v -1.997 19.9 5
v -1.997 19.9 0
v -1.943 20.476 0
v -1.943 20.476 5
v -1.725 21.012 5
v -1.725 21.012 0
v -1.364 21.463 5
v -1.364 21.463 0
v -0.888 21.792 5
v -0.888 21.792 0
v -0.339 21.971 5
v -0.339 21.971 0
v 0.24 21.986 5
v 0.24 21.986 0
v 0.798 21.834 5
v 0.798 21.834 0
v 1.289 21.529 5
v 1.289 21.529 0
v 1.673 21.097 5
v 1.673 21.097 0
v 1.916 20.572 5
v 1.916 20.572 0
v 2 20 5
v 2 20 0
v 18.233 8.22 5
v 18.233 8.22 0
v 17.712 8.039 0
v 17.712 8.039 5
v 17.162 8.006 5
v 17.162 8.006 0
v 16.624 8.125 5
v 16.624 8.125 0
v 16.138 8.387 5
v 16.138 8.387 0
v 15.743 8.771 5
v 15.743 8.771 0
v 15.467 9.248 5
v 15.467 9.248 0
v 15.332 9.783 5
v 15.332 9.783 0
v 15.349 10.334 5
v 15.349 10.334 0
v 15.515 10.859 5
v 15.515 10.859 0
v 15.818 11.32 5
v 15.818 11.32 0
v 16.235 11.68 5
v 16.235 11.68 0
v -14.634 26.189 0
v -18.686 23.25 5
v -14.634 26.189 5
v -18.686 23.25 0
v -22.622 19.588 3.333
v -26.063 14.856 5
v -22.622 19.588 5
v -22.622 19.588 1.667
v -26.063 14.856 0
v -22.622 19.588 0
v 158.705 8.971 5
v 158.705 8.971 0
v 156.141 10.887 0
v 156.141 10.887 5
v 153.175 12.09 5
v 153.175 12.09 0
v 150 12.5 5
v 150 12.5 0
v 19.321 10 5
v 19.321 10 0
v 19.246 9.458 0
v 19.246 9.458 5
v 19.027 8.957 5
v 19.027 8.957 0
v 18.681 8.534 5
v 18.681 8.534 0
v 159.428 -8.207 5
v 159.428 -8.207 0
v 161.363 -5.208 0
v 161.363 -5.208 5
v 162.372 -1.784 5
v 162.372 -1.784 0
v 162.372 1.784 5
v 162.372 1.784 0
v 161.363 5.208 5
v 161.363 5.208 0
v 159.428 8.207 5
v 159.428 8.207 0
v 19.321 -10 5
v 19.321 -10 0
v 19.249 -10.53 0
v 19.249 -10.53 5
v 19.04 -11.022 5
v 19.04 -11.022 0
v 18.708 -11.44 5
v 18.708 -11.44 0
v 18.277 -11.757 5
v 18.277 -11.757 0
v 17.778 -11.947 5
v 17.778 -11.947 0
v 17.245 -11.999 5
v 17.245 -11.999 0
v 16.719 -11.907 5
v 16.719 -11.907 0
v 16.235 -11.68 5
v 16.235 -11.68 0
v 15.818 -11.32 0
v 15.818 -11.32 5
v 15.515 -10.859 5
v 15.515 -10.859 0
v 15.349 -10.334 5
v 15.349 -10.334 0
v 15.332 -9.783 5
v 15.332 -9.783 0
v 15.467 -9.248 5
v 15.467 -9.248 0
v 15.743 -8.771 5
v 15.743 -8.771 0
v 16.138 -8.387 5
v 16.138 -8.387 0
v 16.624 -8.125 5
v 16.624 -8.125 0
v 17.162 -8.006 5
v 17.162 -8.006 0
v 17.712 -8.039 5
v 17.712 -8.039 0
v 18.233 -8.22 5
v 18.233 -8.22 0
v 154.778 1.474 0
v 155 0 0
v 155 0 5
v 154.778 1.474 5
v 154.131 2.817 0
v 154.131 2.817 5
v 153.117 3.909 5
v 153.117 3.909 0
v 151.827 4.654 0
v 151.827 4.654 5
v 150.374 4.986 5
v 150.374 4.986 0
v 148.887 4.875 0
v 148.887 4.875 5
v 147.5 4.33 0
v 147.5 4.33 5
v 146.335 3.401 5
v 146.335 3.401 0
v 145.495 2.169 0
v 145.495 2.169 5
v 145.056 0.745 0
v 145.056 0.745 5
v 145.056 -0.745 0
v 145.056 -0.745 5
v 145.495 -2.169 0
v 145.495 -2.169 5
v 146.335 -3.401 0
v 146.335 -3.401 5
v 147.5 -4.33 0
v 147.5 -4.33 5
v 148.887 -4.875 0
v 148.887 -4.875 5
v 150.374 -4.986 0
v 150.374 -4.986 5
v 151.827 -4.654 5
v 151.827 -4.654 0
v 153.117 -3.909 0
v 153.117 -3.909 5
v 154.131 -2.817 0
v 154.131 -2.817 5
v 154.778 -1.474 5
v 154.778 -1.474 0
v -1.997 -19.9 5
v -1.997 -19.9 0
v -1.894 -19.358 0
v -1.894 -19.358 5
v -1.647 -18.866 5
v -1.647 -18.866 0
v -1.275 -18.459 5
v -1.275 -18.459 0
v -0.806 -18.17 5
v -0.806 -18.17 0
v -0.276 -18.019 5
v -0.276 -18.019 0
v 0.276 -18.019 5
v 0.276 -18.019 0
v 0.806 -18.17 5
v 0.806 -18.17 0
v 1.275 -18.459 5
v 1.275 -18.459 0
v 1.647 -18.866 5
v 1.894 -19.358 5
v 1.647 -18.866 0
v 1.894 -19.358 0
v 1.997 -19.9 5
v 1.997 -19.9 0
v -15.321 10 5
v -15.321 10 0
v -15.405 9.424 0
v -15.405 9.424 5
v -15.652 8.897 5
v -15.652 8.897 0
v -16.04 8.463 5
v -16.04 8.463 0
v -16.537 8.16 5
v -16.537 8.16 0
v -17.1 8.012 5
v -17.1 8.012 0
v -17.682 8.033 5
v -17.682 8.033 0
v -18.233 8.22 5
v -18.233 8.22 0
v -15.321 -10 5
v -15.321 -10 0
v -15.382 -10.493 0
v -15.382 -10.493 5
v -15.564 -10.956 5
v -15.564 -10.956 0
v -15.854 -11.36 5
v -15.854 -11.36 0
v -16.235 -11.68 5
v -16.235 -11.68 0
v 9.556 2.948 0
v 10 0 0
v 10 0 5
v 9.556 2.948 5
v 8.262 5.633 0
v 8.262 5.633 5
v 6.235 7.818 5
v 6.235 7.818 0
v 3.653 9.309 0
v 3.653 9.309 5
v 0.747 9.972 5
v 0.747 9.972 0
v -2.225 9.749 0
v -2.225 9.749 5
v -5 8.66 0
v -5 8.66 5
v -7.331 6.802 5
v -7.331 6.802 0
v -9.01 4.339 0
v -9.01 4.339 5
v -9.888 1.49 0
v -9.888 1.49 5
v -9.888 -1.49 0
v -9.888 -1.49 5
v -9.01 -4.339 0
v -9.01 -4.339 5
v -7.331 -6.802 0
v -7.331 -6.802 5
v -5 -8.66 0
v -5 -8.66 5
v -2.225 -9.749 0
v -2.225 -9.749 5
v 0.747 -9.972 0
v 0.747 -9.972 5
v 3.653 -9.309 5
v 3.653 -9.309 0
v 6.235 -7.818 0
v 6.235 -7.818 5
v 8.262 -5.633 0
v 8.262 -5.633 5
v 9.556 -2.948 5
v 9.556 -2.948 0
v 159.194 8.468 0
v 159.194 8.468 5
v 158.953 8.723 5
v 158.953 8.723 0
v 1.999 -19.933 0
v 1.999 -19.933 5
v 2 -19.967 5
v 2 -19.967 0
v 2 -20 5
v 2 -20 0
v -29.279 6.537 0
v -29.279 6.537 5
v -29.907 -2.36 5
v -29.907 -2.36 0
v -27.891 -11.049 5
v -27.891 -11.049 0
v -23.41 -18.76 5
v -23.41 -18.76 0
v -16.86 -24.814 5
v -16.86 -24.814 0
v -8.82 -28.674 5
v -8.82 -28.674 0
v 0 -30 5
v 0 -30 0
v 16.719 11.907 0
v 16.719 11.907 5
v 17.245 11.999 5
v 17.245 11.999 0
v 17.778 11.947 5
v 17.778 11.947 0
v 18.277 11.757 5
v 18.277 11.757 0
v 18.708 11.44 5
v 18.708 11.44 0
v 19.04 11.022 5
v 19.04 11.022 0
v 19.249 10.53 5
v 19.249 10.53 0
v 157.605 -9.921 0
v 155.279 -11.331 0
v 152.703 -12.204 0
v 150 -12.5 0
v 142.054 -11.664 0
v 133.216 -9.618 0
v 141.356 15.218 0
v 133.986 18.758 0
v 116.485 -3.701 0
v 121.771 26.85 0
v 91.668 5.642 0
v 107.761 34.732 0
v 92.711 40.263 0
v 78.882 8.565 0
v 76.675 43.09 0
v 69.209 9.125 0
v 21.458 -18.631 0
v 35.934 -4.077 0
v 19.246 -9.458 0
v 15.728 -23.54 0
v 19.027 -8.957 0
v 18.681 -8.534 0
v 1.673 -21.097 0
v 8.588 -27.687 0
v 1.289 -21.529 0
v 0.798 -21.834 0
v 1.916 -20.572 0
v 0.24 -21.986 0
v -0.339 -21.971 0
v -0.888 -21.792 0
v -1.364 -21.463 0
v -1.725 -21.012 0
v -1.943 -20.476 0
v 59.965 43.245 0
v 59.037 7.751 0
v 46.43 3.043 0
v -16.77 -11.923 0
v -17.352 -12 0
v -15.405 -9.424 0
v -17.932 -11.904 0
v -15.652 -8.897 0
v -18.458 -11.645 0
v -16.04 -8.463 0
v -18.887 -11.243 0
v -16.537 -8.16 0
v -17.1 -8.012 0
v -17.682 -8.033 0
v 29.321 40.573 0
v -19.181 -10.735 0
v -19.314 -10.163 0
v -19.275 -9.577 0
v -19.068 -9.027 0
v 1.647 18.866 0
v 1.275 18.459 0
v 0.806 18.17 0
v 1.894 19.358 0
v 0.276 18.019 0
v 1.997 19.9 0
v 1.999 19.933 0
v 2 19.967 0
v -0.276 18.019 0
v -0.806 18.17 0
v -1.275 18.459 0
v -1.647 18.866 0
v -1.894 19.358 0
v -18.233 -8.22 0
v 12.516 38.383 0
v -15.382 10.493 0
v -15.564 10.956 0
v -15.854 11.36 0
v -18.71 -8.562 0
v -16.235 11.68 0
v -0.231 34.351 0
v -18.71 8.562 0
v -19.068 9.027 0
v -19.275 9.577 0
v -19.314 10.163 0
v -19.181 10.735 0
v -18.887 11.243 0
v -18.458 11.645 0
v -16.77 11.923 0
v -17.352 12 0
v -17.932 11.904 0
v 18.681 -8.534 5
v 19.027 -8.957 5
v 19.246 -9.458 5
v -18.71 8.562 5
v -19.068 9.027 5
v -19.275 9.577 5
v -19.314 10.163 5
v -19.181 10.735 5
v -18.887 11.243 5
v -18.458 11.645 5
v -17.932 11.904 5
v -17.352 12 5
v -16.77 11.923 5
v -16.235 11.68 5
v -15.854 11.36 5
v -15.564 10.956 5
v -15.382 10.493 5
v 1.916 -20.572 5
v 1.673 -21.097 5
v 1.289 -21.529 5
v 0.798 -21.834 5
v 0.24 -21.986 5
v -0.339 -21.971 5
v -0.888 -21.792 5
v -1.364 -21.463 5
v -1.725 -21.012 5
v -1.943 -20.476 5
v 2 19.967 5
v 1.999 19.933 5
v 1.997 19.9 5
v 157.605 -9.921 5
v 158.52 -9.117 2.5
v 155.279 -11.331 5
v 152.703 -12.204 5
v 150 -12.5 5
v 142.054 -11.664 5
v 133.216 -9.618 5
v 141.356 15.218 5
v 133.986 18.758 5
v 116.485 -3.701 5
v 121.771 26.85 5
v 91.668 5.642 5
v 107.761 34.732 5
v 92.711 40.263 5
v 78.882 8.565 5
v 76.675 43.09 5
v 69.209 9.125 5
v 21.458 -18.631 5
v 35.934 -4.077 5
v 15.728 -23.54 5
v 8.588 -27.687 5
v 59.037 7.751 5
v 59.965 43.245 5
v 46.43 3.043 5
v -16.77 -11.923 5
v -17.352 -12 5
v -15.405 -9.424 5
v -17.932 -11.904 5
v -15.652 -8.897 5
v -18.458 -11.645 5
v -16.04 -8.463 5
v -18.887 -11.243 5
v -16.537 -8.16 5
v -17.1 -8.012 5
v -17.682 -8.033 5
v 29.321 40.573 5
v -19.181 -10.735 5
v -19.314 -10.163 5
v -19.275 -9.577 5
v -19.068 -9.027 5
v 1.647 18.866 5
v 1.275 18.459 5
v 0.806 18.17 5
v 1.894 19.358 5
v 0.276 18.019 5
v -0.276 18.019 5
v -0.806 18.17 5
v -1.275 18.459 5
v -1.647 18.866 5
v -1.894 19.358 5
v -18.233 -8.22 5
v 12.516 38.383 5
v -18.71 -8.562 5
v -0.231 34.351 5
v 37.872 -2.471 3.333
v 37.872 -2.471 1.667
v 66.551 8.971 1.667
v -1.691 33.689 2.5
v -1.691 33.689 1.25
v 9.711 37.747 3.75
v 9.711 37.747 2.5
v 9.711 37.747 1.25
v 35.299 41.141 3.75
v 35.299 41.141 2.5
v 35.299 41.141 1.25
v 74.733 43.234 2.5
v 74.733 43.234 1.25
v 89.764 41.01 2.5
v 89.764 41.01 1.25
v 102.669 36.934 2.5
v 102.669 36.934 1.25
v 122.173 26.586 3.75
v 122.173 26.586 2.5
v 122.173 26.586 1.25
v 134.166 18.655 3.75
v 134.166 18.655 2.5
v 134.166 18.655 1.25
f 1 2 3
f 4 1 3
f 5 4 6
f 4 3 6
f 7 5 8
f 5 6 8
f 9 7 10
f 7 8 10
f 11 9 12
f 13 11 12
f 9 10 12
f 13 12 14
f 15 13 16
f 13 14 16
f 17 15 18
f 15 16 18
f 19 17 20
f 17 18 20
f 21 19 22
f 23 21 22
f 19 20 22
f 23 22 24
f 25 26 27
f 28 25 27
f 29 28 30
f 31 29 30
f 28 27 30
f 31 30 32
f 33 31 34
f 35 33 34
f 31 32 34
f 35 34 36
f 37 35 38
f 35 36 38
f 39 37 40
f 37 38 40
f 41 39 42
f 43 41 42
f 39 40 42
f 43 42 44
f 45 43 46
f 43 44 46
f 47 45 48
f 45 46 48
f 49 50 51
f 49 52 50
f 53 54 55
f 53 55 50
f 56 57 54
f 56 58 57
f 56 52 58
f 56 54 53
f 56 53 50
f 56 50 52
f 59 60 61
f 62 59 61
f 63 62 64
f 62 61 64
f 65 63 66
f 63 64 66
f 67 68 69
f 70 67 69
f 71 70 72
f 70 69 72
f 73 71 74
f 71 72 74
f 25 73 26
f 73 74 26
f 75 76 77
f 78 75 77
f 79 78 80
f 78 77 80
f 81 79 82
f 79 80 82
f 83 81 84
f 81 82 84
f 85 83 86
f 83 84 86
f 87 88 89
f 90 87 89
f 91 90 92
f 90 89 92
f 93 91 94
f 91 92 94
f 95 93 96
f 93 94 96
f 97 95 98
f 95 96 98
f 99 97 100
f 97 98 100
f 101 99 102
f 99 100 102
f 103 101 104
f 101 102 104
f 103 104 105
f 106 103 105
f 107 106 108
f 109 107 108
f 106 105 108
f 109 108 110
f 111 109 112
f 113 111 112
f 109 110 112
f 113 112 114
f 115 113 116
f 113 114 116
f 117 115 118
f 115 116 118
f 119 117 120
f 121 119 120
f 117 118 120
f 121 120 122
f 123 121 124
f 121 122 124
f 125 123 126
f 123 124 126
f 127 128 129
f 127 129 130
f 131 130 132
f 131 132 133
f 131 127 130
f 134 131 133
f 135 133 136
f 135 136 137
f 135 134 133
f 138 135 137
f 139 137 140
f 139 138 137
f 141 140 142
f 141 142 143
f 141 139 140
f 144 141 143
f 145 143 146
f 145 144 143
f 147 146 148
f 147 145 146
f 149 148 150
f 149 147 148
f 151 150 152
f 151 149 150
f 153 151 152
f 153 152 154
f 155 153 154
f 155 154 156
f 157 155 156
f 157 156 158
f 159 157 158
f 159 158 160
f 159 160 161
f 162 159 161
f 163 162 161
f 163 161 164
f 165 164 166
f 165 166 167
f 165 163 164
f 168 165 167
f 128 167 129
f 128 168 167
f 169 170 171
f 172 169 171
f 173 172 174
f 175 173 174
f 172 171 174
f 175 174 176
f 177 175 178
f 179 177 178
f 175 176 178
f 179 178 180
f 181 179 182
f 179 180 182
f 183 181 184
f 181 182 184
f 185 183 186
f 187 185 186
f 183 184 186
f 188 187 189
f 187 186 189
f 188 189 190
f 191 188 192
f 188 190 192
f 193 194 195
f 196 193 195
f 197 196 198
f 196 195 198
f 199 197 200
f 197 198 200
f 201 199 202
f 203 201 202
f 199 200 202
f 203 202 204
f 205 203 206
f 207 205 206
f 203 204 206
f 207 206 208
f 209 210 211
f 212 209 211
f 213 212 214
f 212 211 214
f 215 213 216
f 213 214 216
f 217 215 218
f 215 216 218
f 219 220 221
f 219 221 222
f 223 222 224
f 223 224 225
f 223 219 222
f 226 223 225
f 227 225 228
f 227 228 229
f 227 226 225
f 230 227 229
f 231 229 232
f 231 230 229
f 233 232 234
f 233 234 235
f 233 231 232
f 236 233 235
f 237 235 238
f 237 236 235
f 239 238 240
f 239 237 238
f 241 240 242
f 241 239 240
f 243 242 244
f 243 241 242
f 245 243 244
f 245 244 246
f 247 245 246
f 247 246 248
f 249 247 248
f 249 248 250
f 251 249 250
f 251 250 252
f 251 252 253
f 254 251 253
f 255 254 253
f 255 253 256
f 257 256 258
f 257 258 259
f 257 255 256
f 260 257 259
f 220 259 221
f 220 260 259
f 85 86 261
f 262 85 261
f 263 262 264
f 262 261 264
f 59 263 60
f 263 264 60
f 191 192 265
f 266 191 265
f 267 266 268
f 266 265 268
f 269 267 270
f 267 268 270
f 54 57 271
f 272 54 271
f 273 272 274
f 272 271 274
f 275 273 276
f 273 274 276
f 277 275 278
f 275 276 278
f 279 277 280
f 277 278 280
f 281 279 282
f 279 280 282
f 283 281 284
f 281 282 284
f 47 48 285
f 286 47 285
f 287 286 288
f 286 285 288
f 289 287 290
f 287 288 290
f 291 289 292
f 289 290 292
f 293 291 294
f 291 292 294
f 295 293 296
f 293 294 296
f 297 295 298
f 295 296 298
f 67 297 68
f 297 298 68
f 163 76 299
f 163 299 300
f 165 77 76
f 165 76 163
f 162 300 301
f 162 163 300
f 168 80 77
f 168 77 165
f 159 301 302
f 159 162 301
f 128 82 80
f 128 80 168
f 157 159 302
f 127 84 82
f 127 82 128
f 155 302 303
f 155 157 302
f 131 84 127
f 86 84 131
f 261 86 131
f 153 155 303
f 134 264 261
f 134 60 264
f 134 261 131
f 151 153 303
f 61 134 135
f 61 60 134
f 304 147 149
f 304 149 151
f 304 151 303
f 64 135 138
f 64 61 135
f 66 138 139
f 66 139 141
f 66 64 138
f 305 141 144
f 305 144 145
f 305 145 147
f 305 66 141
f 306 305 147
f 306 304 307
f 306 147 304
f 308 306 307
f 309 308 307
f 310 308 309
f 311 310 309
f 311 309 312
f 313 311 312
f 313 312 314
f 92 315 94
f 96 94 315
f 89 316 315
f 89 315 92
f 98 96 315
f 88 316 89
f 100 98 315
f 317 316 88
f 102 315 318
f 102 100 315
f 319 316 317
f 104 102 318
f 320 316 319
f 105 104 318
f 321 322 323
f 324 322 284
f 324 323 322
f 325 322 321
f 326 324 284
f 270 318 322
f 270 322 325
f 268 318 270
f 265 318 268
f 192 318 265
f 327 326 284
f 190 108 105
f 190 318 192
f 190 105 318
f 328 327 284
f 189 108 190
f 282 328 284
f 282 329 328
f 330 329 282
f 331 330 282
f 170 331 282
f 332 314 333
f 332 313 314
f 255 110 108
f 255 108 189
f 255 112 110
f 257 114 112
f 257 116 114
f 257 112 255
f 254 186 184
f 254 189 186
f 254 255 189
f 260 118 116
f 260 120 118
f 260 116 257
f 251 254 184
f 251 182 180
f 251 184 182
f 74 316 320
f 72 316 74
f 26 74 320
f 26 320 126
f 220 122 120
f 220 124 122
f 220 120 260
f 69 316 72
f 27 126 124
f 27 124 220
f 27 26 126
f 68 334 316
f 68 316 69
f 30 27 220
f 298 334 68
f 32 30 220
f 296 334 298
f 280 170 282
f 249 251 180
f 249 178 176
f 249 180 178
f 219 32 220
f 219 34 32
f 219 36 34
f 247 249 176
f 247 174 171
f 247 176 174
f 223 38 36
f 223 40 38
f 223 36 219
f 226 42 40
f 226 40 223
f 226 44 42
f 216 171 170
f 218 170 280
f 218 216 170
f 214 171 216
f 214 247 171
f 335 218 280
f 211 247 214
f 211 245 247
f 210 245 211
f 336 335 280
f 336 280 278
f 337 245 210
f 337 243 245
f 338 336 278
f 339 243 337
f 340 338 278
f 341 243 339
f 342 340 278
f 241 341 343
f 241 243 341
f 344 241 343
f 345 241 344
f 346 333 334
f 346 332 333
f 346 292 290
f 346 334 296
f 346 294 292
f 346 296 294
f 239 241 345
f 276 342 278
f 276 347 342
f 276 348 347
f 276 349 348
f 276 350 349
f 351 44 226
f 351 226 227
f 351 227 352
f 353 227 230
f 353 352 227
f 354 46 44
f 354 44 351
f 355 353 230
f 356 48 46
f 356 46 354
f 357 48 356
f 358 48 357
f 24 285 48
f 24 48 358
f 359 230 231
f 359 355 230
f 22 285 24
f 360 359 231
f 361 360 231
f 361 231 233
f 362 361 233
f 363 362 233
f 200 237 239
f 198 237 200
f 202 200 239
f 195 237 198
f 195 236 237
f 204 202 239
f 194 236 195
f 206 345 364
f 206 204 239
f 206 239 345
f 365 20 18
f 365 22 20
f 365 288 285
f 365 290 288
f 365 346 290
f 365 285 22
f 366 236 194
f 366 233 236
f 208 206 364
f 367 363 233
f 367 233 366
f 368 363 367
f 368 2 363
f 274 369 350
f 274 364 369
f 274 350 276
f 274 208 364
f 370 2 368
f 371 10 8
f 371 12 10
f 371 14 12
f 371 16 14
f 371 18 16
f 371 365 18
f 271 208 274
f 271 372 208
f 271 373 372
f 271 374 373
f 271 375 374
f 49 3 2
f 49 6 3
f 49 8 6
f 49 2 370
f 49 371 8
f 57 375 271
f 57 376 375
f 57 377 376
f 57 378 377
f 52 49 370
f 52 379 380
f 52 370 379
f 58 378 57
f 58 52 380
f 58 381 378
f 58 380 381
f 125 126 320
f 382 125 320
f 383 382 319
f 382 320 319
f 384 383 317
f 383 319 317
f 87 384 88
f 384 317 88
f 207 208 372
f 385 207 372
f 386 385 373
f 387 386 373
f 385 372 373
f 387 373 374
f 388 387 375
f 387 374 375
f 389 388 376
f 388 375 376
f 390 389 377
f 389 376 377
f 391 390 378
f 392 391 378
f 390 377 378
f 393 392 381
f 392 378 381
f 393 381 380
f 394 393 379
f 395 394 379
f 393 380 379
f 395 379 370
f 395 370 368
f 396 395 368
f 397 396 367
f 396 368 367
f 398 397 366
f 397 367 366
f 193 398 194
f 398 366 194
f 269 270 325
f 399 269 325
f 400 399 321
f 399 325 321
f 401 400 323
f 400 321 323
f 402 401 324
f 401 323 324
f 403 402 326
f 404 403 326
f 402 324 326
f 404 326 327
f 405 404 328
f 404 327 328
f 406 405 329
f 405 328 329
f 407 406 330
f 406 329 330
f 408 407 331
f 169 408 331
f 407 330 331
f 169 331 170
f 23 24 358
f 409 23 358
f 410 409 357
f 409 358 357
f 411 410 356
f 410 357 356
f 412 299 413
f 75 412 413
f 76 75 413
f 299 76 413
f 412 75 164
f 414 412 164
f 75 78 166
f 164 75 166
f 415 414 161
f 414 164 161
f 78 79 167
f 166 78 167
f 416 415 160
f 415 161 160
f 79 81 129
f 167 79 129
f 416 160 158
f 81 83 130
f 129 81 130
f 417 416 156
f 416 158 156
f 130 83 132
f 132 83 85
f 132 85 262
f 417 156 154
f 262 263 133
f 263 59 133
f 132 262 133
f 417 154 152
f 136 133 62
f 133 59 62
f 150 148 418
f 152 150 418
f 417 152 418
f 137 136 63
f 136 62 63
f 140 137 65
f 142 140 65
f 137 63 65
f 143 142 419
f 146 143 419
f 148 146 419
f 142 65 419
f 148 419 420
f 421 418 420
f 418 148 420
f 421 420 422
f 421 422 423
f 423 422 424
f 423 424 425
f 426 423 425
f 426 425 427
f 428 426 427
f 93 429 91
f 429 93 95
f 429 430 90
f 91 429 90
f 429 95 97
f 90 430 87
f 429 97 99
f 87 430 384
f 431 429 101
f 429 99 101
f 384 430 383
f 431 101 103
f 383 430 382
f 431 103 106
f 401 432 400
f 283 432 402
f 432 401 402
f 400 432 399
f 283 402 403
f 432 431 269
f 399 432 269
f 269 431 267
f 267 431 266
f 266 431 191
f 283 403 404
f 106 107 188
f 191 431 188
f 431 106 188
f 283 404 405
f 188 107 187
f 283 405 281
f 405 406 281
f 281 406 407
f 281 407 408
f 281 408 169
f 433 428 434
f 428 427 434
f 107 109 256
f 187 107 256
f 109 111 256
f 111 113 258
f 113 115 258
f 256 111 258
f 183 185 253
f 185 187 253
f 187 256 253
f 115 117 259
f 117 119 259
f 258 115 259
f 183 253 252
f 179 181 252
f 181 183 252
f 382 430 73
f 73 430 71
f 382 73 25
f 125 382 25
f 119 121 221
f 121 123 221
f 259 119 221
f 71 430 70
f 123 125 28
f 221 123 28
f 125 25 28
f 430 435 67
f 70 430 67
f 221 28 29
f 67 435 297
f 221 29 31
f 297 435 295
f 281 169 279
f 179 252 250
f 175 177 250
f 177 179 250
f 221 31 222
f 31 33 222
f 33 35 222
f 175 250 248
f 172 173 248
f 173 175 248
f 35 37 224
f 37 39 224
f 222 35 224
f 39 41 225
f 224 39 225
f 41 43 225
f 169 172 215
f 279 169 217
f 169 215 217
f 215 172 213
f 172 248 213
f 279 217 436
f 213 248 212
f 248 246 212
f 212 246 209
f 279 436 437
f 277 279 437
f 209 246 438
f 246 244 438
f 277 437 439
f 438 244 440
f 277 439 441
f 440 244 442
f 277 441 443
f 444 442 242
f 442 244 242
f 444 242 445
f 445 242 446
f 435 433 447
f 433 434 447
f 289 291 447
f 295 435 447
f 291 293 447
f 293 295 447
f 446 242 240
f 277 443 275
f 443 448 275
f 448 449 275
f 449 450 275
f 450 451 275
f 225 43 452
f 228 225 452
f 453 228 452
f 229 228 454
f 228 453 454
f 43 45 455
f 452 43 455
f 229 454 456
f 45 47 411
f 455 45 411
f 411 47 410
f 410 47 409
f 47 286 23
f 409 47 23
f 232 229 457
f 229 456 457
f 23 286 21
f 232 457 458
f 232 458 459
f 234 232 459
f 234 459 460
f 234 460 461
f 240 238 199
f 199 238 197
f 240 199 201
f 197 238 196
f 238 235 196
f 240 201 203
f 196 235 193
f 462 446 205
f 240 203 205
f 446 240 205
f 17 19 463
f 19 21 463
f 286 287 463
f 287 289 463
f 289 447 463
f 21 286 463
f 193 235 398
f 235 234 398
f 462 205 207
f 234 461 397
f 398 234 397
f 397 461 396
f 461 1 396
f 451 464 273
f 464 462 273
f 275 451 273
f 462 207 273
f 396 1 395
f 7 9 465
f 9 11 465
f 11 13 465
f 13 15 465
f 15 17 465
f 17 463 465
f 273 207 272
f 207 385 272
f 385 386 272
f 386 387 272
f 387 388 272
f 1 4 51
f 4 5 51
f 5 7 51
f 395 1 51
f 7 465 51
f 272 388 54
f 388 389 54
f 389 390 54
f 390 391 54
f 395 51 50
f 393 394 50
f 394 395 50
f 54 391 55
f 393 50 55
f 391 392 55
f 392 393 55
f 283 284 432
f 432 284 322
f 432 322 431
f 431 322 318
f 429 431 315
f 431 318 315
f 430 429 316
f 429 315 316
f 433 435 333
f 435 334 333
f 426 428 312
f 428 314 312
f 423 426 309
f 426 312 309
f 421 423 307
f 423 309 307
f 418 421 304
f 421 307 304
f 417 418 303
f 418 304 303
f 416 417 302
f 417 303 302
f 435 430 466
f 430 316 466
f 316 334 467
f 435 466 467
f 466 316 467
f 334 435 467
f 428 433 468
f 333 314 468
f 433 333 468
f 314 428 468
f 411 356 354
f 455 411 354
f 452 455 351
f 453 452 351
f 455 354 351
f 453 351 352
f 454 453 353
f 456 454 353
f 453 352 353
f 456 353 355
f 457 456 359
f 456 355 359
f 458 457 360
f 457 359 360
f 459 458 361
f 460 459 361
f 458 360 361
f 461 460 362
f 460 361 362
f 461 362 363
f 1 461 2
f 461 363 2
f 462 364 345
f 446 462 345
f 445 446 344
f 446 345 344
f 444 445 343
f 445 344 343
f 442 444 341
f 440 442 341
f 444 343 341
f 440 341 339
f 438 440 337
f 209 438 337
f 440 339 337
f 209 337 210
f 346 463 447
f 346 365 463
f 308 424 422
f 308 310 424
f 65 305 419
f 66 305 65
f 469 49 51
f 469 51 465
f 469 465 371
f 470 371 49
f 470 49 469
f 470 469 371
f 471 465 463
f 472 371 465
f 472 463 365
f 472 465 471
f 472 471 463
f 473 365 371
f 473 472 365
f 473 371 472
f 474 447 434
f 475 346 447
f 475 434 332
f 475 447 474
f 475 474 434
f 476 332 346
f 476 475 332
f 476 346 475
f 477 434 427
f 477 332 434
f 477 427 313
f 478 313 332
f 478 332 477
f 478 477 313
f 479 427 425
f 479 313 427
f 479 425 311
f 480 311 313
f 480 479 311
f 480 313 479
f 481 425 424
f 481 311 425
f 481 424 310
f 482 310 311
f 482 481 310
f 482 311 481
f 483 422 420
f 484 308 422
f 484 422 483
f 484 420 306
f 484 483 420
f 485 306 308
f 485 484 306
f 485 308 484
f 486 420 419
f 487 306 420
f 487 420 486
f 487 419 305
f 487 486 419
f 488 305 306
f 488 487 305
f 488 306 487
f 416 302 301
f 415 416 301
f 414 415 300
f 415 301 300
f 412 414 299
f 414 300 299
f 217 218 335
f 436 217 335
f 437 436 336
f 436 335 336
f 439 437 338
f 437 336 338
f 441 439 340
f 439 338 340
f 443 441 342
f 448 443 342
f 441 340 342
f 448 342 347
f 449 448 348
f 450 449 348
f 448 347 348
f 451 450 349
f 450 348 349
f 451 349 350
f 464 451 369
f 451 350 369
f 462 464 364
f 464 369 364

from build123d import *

# Parameters (mm, degrees)
SKETCH1_R           = 5
SKETCH1_R_2         = 10
BOSS_EXTRUDE3_DEPTH = 5


with BuildPart() as part:
    # Sketch1 → Boss-Extrude3 (new body)
    with BuildSketch(Plane.XY):
        with BuildLine():
            add(Edge.make_bspline(
                [(-26.063461661, 14.855839466), (-22.995207495, 20.238862419), (-18.617864266, 23.494747377), (-14.633714845, 26.188821849)],
                knots=[0, 0, 0, 0, 0.056043779, 0.056043779, 0.056043779, 0.056043779], degree=3))
            ThreePointArc((-26.063461661, 14.855839466), (-25.939113169, -15.071907909), (0, -30))
            add(Edge.make_bspline(
                [(0, -30), (17.93675339, -27.745895163), (30.170167076, -2.352031791), (85.215870065, 19.611994815), (122.19936238, -11.53423425), (150, -12.5)],
                knots=[0, 0, 0, 0, 0.288188908, 0.475939829, 1, 1, 1, 1], degree=3))
            ThreePointArc((150, -12.5), (154.015063849, -11.837620635), (157.604608427, -9.920681966))
            add(Edge.make_bspline(
                [(157.604608427, -9.920681966), (158.523147842, -9.170588579), (159.428456142, -8.206961361)],
                knots=[0.991193685, 0.991193685, 0.991193685, 1, 1, 1], degree=2))
            ThreePointArc((159.428456142, -8.206961361), (162.5, 0), (159.428456142, 8.206961361))
            ThreePointArc((159.428456142, 8.206961361), (159.074763389, 8.59643353), (158.704995258, 8.970677653))
            ThreePointArc((158.704995258, 8.970677653), (154.696622688, 11.584115647), (150, 12.5))
            add(Edge.make_bspline(
                [(-14.633714845, 26.188821849), (4.471910737, 39.10801054), (20.159751535, 39.107737434), (86.741615763, 46.999815307), (125.812924925, 25.830072722), (135.882657692, 16.075482759), (150, 12.5)],
                knots=[0.056043779, 0.056043779, 0.056043779, 0.056043779, 0.324796613, 0.474987684, 0.725167046, 0.945335071, 0.945335071, 0.945335071, 0.945335071], degree=3))
        make_face()
        with BuildLine():
            ThreePointArc((18.232654753, 8.220115611), (19.553172314, 4.203980551), (20, 0))
            ThreePointArc((20, 0), (19.553172314, -4.203980551), (18.232654753, -8.220115611))
            ThreePointArc((18.232654753, -8.220115611), (19.027009373, -8.956997928), (19.320508076, -10))
            ThreePointArc((19.320508076, -10), (18.276880515, -11.756516939), (16.235156318, -11.679884389))
            ThreePointArc((16.235156318, -11.679884389), (10, -17.320508076), (1.997498436, -19.9))
            ThreePointArc((1.997498436, -19.9), (1.999374511, -19.949984358), (2, -20))
            ThreePointArc((2, -20), (-0.050015642, -21.999374511), (-1.997498436, -19.9))
            ThreePointArc((-1.997498436, -19.9), (-10, -17.320508076), (-16.235156318, -11.679884389))
            ThreePointArc((-16.235156318, -11.679884389), (-19.052558883, -11), (-18.232654753, -8.220115611))
            ThreePointArc((-18.232654753, -8.220115611), (-20, 0), (-18.232654753, 8.220115611))
            ThreePointArc((-18.232654753, 8.220115611), (-19.052558883, 11), (-16.235156318, 11.679884389))
            ThreePointArc((-16.235156318, 11.679884389), (-10, 17.320508076), (-1.997498436, 19.9))
            ThreePointArc((-1.997498436, 19.9), (-0.050015642, 21.999374511), (2, 20))
            ThreePointArc((2, 20), (1.999374511, 19.949984358), (1.997498436, 19.9))
            ThreePointArc((1.997498436, 19.9), (10, 17.320508076), (16.235156318, 11.679884389))
            ThreePointArc((16.235156318, 11.679884389), (18.276880515, 11.756516939), (19.320508076, 10))
            ThreePointArc((19.320508076, 10), (19.027009373, 8.956997928), (18.232654753, 8.220115611))
        make_face(mode=Mode.SUBTRACT)
        with Locations((150, 0)):
            Circle(SKETCH1_R, mode=Mode.SUBTRACT)
        with BuildLine():
            ThreePointArc((18.232654753, -8.220115611), (19.553172314, -4.203980551), (20, 0))
            ThreePointArc((20, 0), (19.553172314, 4.203980551), (18.232654753, 8.220115611))
            ThreePointArc((18.232654753, 8.220115611), (15.588457268, 9), (16.235156318, 11.679884389))
            ThreePointArc((16.235156318, 11.679884389), (10, 17.320508076), (1.997498436, 19.9))
            ThreePointArc((1.997498436, 19.9), (0, 18), (-1.997498436, 19.9))
            ThreePointArc((-1.997498436, 19.9), (-10, 17.320508076), (-16.235156318, 11.679884389))
            ThreePointArc((-16.235156318, 11.679884389), (-15.563991136, 10.956372439), (-15.320508076, 10))
            ThreePointArc((-15.320508076, 10), (-16.277506003, 8.293498703), (-18.232654753, 8.220115611))
            ThreePointArc((-18.232654753, 8.220115611), (-20, 0), (-18.232654753, -8.220115611))
            ThreePointArc((-18.232654753, -8.220115611), (-16.277506003, -8.293498703), (-15.320508076, -10))
            ThreePointArc((-15.320508076, -10), (-15.563991136, -10.956372439), (-16.235156318, -11.679884389))
            ThreePointArc((-16.235156318, -11.679884389), (-10, -17.320508076), (-1.997498436, -19.9))
            ThreePointArc((-1.997498436, -19.9), (0, -18), (1.997498436, -19.9))
            ThreePointArc((1.997498436, -19.9), (10, -17.320508076), (16.235156318, -11.679884389))
            ThreePointArc((16.235156318, -11.679884389), (15.588457268, -9), (18.232654753, -8.220115611))
        make_face()
        Circle(SKETCH1_R_2, mode=Mode.SUBTRACT)
    extrude(amount=BOSS_EXTRUDE3_DEPTH)


solid = part.part
